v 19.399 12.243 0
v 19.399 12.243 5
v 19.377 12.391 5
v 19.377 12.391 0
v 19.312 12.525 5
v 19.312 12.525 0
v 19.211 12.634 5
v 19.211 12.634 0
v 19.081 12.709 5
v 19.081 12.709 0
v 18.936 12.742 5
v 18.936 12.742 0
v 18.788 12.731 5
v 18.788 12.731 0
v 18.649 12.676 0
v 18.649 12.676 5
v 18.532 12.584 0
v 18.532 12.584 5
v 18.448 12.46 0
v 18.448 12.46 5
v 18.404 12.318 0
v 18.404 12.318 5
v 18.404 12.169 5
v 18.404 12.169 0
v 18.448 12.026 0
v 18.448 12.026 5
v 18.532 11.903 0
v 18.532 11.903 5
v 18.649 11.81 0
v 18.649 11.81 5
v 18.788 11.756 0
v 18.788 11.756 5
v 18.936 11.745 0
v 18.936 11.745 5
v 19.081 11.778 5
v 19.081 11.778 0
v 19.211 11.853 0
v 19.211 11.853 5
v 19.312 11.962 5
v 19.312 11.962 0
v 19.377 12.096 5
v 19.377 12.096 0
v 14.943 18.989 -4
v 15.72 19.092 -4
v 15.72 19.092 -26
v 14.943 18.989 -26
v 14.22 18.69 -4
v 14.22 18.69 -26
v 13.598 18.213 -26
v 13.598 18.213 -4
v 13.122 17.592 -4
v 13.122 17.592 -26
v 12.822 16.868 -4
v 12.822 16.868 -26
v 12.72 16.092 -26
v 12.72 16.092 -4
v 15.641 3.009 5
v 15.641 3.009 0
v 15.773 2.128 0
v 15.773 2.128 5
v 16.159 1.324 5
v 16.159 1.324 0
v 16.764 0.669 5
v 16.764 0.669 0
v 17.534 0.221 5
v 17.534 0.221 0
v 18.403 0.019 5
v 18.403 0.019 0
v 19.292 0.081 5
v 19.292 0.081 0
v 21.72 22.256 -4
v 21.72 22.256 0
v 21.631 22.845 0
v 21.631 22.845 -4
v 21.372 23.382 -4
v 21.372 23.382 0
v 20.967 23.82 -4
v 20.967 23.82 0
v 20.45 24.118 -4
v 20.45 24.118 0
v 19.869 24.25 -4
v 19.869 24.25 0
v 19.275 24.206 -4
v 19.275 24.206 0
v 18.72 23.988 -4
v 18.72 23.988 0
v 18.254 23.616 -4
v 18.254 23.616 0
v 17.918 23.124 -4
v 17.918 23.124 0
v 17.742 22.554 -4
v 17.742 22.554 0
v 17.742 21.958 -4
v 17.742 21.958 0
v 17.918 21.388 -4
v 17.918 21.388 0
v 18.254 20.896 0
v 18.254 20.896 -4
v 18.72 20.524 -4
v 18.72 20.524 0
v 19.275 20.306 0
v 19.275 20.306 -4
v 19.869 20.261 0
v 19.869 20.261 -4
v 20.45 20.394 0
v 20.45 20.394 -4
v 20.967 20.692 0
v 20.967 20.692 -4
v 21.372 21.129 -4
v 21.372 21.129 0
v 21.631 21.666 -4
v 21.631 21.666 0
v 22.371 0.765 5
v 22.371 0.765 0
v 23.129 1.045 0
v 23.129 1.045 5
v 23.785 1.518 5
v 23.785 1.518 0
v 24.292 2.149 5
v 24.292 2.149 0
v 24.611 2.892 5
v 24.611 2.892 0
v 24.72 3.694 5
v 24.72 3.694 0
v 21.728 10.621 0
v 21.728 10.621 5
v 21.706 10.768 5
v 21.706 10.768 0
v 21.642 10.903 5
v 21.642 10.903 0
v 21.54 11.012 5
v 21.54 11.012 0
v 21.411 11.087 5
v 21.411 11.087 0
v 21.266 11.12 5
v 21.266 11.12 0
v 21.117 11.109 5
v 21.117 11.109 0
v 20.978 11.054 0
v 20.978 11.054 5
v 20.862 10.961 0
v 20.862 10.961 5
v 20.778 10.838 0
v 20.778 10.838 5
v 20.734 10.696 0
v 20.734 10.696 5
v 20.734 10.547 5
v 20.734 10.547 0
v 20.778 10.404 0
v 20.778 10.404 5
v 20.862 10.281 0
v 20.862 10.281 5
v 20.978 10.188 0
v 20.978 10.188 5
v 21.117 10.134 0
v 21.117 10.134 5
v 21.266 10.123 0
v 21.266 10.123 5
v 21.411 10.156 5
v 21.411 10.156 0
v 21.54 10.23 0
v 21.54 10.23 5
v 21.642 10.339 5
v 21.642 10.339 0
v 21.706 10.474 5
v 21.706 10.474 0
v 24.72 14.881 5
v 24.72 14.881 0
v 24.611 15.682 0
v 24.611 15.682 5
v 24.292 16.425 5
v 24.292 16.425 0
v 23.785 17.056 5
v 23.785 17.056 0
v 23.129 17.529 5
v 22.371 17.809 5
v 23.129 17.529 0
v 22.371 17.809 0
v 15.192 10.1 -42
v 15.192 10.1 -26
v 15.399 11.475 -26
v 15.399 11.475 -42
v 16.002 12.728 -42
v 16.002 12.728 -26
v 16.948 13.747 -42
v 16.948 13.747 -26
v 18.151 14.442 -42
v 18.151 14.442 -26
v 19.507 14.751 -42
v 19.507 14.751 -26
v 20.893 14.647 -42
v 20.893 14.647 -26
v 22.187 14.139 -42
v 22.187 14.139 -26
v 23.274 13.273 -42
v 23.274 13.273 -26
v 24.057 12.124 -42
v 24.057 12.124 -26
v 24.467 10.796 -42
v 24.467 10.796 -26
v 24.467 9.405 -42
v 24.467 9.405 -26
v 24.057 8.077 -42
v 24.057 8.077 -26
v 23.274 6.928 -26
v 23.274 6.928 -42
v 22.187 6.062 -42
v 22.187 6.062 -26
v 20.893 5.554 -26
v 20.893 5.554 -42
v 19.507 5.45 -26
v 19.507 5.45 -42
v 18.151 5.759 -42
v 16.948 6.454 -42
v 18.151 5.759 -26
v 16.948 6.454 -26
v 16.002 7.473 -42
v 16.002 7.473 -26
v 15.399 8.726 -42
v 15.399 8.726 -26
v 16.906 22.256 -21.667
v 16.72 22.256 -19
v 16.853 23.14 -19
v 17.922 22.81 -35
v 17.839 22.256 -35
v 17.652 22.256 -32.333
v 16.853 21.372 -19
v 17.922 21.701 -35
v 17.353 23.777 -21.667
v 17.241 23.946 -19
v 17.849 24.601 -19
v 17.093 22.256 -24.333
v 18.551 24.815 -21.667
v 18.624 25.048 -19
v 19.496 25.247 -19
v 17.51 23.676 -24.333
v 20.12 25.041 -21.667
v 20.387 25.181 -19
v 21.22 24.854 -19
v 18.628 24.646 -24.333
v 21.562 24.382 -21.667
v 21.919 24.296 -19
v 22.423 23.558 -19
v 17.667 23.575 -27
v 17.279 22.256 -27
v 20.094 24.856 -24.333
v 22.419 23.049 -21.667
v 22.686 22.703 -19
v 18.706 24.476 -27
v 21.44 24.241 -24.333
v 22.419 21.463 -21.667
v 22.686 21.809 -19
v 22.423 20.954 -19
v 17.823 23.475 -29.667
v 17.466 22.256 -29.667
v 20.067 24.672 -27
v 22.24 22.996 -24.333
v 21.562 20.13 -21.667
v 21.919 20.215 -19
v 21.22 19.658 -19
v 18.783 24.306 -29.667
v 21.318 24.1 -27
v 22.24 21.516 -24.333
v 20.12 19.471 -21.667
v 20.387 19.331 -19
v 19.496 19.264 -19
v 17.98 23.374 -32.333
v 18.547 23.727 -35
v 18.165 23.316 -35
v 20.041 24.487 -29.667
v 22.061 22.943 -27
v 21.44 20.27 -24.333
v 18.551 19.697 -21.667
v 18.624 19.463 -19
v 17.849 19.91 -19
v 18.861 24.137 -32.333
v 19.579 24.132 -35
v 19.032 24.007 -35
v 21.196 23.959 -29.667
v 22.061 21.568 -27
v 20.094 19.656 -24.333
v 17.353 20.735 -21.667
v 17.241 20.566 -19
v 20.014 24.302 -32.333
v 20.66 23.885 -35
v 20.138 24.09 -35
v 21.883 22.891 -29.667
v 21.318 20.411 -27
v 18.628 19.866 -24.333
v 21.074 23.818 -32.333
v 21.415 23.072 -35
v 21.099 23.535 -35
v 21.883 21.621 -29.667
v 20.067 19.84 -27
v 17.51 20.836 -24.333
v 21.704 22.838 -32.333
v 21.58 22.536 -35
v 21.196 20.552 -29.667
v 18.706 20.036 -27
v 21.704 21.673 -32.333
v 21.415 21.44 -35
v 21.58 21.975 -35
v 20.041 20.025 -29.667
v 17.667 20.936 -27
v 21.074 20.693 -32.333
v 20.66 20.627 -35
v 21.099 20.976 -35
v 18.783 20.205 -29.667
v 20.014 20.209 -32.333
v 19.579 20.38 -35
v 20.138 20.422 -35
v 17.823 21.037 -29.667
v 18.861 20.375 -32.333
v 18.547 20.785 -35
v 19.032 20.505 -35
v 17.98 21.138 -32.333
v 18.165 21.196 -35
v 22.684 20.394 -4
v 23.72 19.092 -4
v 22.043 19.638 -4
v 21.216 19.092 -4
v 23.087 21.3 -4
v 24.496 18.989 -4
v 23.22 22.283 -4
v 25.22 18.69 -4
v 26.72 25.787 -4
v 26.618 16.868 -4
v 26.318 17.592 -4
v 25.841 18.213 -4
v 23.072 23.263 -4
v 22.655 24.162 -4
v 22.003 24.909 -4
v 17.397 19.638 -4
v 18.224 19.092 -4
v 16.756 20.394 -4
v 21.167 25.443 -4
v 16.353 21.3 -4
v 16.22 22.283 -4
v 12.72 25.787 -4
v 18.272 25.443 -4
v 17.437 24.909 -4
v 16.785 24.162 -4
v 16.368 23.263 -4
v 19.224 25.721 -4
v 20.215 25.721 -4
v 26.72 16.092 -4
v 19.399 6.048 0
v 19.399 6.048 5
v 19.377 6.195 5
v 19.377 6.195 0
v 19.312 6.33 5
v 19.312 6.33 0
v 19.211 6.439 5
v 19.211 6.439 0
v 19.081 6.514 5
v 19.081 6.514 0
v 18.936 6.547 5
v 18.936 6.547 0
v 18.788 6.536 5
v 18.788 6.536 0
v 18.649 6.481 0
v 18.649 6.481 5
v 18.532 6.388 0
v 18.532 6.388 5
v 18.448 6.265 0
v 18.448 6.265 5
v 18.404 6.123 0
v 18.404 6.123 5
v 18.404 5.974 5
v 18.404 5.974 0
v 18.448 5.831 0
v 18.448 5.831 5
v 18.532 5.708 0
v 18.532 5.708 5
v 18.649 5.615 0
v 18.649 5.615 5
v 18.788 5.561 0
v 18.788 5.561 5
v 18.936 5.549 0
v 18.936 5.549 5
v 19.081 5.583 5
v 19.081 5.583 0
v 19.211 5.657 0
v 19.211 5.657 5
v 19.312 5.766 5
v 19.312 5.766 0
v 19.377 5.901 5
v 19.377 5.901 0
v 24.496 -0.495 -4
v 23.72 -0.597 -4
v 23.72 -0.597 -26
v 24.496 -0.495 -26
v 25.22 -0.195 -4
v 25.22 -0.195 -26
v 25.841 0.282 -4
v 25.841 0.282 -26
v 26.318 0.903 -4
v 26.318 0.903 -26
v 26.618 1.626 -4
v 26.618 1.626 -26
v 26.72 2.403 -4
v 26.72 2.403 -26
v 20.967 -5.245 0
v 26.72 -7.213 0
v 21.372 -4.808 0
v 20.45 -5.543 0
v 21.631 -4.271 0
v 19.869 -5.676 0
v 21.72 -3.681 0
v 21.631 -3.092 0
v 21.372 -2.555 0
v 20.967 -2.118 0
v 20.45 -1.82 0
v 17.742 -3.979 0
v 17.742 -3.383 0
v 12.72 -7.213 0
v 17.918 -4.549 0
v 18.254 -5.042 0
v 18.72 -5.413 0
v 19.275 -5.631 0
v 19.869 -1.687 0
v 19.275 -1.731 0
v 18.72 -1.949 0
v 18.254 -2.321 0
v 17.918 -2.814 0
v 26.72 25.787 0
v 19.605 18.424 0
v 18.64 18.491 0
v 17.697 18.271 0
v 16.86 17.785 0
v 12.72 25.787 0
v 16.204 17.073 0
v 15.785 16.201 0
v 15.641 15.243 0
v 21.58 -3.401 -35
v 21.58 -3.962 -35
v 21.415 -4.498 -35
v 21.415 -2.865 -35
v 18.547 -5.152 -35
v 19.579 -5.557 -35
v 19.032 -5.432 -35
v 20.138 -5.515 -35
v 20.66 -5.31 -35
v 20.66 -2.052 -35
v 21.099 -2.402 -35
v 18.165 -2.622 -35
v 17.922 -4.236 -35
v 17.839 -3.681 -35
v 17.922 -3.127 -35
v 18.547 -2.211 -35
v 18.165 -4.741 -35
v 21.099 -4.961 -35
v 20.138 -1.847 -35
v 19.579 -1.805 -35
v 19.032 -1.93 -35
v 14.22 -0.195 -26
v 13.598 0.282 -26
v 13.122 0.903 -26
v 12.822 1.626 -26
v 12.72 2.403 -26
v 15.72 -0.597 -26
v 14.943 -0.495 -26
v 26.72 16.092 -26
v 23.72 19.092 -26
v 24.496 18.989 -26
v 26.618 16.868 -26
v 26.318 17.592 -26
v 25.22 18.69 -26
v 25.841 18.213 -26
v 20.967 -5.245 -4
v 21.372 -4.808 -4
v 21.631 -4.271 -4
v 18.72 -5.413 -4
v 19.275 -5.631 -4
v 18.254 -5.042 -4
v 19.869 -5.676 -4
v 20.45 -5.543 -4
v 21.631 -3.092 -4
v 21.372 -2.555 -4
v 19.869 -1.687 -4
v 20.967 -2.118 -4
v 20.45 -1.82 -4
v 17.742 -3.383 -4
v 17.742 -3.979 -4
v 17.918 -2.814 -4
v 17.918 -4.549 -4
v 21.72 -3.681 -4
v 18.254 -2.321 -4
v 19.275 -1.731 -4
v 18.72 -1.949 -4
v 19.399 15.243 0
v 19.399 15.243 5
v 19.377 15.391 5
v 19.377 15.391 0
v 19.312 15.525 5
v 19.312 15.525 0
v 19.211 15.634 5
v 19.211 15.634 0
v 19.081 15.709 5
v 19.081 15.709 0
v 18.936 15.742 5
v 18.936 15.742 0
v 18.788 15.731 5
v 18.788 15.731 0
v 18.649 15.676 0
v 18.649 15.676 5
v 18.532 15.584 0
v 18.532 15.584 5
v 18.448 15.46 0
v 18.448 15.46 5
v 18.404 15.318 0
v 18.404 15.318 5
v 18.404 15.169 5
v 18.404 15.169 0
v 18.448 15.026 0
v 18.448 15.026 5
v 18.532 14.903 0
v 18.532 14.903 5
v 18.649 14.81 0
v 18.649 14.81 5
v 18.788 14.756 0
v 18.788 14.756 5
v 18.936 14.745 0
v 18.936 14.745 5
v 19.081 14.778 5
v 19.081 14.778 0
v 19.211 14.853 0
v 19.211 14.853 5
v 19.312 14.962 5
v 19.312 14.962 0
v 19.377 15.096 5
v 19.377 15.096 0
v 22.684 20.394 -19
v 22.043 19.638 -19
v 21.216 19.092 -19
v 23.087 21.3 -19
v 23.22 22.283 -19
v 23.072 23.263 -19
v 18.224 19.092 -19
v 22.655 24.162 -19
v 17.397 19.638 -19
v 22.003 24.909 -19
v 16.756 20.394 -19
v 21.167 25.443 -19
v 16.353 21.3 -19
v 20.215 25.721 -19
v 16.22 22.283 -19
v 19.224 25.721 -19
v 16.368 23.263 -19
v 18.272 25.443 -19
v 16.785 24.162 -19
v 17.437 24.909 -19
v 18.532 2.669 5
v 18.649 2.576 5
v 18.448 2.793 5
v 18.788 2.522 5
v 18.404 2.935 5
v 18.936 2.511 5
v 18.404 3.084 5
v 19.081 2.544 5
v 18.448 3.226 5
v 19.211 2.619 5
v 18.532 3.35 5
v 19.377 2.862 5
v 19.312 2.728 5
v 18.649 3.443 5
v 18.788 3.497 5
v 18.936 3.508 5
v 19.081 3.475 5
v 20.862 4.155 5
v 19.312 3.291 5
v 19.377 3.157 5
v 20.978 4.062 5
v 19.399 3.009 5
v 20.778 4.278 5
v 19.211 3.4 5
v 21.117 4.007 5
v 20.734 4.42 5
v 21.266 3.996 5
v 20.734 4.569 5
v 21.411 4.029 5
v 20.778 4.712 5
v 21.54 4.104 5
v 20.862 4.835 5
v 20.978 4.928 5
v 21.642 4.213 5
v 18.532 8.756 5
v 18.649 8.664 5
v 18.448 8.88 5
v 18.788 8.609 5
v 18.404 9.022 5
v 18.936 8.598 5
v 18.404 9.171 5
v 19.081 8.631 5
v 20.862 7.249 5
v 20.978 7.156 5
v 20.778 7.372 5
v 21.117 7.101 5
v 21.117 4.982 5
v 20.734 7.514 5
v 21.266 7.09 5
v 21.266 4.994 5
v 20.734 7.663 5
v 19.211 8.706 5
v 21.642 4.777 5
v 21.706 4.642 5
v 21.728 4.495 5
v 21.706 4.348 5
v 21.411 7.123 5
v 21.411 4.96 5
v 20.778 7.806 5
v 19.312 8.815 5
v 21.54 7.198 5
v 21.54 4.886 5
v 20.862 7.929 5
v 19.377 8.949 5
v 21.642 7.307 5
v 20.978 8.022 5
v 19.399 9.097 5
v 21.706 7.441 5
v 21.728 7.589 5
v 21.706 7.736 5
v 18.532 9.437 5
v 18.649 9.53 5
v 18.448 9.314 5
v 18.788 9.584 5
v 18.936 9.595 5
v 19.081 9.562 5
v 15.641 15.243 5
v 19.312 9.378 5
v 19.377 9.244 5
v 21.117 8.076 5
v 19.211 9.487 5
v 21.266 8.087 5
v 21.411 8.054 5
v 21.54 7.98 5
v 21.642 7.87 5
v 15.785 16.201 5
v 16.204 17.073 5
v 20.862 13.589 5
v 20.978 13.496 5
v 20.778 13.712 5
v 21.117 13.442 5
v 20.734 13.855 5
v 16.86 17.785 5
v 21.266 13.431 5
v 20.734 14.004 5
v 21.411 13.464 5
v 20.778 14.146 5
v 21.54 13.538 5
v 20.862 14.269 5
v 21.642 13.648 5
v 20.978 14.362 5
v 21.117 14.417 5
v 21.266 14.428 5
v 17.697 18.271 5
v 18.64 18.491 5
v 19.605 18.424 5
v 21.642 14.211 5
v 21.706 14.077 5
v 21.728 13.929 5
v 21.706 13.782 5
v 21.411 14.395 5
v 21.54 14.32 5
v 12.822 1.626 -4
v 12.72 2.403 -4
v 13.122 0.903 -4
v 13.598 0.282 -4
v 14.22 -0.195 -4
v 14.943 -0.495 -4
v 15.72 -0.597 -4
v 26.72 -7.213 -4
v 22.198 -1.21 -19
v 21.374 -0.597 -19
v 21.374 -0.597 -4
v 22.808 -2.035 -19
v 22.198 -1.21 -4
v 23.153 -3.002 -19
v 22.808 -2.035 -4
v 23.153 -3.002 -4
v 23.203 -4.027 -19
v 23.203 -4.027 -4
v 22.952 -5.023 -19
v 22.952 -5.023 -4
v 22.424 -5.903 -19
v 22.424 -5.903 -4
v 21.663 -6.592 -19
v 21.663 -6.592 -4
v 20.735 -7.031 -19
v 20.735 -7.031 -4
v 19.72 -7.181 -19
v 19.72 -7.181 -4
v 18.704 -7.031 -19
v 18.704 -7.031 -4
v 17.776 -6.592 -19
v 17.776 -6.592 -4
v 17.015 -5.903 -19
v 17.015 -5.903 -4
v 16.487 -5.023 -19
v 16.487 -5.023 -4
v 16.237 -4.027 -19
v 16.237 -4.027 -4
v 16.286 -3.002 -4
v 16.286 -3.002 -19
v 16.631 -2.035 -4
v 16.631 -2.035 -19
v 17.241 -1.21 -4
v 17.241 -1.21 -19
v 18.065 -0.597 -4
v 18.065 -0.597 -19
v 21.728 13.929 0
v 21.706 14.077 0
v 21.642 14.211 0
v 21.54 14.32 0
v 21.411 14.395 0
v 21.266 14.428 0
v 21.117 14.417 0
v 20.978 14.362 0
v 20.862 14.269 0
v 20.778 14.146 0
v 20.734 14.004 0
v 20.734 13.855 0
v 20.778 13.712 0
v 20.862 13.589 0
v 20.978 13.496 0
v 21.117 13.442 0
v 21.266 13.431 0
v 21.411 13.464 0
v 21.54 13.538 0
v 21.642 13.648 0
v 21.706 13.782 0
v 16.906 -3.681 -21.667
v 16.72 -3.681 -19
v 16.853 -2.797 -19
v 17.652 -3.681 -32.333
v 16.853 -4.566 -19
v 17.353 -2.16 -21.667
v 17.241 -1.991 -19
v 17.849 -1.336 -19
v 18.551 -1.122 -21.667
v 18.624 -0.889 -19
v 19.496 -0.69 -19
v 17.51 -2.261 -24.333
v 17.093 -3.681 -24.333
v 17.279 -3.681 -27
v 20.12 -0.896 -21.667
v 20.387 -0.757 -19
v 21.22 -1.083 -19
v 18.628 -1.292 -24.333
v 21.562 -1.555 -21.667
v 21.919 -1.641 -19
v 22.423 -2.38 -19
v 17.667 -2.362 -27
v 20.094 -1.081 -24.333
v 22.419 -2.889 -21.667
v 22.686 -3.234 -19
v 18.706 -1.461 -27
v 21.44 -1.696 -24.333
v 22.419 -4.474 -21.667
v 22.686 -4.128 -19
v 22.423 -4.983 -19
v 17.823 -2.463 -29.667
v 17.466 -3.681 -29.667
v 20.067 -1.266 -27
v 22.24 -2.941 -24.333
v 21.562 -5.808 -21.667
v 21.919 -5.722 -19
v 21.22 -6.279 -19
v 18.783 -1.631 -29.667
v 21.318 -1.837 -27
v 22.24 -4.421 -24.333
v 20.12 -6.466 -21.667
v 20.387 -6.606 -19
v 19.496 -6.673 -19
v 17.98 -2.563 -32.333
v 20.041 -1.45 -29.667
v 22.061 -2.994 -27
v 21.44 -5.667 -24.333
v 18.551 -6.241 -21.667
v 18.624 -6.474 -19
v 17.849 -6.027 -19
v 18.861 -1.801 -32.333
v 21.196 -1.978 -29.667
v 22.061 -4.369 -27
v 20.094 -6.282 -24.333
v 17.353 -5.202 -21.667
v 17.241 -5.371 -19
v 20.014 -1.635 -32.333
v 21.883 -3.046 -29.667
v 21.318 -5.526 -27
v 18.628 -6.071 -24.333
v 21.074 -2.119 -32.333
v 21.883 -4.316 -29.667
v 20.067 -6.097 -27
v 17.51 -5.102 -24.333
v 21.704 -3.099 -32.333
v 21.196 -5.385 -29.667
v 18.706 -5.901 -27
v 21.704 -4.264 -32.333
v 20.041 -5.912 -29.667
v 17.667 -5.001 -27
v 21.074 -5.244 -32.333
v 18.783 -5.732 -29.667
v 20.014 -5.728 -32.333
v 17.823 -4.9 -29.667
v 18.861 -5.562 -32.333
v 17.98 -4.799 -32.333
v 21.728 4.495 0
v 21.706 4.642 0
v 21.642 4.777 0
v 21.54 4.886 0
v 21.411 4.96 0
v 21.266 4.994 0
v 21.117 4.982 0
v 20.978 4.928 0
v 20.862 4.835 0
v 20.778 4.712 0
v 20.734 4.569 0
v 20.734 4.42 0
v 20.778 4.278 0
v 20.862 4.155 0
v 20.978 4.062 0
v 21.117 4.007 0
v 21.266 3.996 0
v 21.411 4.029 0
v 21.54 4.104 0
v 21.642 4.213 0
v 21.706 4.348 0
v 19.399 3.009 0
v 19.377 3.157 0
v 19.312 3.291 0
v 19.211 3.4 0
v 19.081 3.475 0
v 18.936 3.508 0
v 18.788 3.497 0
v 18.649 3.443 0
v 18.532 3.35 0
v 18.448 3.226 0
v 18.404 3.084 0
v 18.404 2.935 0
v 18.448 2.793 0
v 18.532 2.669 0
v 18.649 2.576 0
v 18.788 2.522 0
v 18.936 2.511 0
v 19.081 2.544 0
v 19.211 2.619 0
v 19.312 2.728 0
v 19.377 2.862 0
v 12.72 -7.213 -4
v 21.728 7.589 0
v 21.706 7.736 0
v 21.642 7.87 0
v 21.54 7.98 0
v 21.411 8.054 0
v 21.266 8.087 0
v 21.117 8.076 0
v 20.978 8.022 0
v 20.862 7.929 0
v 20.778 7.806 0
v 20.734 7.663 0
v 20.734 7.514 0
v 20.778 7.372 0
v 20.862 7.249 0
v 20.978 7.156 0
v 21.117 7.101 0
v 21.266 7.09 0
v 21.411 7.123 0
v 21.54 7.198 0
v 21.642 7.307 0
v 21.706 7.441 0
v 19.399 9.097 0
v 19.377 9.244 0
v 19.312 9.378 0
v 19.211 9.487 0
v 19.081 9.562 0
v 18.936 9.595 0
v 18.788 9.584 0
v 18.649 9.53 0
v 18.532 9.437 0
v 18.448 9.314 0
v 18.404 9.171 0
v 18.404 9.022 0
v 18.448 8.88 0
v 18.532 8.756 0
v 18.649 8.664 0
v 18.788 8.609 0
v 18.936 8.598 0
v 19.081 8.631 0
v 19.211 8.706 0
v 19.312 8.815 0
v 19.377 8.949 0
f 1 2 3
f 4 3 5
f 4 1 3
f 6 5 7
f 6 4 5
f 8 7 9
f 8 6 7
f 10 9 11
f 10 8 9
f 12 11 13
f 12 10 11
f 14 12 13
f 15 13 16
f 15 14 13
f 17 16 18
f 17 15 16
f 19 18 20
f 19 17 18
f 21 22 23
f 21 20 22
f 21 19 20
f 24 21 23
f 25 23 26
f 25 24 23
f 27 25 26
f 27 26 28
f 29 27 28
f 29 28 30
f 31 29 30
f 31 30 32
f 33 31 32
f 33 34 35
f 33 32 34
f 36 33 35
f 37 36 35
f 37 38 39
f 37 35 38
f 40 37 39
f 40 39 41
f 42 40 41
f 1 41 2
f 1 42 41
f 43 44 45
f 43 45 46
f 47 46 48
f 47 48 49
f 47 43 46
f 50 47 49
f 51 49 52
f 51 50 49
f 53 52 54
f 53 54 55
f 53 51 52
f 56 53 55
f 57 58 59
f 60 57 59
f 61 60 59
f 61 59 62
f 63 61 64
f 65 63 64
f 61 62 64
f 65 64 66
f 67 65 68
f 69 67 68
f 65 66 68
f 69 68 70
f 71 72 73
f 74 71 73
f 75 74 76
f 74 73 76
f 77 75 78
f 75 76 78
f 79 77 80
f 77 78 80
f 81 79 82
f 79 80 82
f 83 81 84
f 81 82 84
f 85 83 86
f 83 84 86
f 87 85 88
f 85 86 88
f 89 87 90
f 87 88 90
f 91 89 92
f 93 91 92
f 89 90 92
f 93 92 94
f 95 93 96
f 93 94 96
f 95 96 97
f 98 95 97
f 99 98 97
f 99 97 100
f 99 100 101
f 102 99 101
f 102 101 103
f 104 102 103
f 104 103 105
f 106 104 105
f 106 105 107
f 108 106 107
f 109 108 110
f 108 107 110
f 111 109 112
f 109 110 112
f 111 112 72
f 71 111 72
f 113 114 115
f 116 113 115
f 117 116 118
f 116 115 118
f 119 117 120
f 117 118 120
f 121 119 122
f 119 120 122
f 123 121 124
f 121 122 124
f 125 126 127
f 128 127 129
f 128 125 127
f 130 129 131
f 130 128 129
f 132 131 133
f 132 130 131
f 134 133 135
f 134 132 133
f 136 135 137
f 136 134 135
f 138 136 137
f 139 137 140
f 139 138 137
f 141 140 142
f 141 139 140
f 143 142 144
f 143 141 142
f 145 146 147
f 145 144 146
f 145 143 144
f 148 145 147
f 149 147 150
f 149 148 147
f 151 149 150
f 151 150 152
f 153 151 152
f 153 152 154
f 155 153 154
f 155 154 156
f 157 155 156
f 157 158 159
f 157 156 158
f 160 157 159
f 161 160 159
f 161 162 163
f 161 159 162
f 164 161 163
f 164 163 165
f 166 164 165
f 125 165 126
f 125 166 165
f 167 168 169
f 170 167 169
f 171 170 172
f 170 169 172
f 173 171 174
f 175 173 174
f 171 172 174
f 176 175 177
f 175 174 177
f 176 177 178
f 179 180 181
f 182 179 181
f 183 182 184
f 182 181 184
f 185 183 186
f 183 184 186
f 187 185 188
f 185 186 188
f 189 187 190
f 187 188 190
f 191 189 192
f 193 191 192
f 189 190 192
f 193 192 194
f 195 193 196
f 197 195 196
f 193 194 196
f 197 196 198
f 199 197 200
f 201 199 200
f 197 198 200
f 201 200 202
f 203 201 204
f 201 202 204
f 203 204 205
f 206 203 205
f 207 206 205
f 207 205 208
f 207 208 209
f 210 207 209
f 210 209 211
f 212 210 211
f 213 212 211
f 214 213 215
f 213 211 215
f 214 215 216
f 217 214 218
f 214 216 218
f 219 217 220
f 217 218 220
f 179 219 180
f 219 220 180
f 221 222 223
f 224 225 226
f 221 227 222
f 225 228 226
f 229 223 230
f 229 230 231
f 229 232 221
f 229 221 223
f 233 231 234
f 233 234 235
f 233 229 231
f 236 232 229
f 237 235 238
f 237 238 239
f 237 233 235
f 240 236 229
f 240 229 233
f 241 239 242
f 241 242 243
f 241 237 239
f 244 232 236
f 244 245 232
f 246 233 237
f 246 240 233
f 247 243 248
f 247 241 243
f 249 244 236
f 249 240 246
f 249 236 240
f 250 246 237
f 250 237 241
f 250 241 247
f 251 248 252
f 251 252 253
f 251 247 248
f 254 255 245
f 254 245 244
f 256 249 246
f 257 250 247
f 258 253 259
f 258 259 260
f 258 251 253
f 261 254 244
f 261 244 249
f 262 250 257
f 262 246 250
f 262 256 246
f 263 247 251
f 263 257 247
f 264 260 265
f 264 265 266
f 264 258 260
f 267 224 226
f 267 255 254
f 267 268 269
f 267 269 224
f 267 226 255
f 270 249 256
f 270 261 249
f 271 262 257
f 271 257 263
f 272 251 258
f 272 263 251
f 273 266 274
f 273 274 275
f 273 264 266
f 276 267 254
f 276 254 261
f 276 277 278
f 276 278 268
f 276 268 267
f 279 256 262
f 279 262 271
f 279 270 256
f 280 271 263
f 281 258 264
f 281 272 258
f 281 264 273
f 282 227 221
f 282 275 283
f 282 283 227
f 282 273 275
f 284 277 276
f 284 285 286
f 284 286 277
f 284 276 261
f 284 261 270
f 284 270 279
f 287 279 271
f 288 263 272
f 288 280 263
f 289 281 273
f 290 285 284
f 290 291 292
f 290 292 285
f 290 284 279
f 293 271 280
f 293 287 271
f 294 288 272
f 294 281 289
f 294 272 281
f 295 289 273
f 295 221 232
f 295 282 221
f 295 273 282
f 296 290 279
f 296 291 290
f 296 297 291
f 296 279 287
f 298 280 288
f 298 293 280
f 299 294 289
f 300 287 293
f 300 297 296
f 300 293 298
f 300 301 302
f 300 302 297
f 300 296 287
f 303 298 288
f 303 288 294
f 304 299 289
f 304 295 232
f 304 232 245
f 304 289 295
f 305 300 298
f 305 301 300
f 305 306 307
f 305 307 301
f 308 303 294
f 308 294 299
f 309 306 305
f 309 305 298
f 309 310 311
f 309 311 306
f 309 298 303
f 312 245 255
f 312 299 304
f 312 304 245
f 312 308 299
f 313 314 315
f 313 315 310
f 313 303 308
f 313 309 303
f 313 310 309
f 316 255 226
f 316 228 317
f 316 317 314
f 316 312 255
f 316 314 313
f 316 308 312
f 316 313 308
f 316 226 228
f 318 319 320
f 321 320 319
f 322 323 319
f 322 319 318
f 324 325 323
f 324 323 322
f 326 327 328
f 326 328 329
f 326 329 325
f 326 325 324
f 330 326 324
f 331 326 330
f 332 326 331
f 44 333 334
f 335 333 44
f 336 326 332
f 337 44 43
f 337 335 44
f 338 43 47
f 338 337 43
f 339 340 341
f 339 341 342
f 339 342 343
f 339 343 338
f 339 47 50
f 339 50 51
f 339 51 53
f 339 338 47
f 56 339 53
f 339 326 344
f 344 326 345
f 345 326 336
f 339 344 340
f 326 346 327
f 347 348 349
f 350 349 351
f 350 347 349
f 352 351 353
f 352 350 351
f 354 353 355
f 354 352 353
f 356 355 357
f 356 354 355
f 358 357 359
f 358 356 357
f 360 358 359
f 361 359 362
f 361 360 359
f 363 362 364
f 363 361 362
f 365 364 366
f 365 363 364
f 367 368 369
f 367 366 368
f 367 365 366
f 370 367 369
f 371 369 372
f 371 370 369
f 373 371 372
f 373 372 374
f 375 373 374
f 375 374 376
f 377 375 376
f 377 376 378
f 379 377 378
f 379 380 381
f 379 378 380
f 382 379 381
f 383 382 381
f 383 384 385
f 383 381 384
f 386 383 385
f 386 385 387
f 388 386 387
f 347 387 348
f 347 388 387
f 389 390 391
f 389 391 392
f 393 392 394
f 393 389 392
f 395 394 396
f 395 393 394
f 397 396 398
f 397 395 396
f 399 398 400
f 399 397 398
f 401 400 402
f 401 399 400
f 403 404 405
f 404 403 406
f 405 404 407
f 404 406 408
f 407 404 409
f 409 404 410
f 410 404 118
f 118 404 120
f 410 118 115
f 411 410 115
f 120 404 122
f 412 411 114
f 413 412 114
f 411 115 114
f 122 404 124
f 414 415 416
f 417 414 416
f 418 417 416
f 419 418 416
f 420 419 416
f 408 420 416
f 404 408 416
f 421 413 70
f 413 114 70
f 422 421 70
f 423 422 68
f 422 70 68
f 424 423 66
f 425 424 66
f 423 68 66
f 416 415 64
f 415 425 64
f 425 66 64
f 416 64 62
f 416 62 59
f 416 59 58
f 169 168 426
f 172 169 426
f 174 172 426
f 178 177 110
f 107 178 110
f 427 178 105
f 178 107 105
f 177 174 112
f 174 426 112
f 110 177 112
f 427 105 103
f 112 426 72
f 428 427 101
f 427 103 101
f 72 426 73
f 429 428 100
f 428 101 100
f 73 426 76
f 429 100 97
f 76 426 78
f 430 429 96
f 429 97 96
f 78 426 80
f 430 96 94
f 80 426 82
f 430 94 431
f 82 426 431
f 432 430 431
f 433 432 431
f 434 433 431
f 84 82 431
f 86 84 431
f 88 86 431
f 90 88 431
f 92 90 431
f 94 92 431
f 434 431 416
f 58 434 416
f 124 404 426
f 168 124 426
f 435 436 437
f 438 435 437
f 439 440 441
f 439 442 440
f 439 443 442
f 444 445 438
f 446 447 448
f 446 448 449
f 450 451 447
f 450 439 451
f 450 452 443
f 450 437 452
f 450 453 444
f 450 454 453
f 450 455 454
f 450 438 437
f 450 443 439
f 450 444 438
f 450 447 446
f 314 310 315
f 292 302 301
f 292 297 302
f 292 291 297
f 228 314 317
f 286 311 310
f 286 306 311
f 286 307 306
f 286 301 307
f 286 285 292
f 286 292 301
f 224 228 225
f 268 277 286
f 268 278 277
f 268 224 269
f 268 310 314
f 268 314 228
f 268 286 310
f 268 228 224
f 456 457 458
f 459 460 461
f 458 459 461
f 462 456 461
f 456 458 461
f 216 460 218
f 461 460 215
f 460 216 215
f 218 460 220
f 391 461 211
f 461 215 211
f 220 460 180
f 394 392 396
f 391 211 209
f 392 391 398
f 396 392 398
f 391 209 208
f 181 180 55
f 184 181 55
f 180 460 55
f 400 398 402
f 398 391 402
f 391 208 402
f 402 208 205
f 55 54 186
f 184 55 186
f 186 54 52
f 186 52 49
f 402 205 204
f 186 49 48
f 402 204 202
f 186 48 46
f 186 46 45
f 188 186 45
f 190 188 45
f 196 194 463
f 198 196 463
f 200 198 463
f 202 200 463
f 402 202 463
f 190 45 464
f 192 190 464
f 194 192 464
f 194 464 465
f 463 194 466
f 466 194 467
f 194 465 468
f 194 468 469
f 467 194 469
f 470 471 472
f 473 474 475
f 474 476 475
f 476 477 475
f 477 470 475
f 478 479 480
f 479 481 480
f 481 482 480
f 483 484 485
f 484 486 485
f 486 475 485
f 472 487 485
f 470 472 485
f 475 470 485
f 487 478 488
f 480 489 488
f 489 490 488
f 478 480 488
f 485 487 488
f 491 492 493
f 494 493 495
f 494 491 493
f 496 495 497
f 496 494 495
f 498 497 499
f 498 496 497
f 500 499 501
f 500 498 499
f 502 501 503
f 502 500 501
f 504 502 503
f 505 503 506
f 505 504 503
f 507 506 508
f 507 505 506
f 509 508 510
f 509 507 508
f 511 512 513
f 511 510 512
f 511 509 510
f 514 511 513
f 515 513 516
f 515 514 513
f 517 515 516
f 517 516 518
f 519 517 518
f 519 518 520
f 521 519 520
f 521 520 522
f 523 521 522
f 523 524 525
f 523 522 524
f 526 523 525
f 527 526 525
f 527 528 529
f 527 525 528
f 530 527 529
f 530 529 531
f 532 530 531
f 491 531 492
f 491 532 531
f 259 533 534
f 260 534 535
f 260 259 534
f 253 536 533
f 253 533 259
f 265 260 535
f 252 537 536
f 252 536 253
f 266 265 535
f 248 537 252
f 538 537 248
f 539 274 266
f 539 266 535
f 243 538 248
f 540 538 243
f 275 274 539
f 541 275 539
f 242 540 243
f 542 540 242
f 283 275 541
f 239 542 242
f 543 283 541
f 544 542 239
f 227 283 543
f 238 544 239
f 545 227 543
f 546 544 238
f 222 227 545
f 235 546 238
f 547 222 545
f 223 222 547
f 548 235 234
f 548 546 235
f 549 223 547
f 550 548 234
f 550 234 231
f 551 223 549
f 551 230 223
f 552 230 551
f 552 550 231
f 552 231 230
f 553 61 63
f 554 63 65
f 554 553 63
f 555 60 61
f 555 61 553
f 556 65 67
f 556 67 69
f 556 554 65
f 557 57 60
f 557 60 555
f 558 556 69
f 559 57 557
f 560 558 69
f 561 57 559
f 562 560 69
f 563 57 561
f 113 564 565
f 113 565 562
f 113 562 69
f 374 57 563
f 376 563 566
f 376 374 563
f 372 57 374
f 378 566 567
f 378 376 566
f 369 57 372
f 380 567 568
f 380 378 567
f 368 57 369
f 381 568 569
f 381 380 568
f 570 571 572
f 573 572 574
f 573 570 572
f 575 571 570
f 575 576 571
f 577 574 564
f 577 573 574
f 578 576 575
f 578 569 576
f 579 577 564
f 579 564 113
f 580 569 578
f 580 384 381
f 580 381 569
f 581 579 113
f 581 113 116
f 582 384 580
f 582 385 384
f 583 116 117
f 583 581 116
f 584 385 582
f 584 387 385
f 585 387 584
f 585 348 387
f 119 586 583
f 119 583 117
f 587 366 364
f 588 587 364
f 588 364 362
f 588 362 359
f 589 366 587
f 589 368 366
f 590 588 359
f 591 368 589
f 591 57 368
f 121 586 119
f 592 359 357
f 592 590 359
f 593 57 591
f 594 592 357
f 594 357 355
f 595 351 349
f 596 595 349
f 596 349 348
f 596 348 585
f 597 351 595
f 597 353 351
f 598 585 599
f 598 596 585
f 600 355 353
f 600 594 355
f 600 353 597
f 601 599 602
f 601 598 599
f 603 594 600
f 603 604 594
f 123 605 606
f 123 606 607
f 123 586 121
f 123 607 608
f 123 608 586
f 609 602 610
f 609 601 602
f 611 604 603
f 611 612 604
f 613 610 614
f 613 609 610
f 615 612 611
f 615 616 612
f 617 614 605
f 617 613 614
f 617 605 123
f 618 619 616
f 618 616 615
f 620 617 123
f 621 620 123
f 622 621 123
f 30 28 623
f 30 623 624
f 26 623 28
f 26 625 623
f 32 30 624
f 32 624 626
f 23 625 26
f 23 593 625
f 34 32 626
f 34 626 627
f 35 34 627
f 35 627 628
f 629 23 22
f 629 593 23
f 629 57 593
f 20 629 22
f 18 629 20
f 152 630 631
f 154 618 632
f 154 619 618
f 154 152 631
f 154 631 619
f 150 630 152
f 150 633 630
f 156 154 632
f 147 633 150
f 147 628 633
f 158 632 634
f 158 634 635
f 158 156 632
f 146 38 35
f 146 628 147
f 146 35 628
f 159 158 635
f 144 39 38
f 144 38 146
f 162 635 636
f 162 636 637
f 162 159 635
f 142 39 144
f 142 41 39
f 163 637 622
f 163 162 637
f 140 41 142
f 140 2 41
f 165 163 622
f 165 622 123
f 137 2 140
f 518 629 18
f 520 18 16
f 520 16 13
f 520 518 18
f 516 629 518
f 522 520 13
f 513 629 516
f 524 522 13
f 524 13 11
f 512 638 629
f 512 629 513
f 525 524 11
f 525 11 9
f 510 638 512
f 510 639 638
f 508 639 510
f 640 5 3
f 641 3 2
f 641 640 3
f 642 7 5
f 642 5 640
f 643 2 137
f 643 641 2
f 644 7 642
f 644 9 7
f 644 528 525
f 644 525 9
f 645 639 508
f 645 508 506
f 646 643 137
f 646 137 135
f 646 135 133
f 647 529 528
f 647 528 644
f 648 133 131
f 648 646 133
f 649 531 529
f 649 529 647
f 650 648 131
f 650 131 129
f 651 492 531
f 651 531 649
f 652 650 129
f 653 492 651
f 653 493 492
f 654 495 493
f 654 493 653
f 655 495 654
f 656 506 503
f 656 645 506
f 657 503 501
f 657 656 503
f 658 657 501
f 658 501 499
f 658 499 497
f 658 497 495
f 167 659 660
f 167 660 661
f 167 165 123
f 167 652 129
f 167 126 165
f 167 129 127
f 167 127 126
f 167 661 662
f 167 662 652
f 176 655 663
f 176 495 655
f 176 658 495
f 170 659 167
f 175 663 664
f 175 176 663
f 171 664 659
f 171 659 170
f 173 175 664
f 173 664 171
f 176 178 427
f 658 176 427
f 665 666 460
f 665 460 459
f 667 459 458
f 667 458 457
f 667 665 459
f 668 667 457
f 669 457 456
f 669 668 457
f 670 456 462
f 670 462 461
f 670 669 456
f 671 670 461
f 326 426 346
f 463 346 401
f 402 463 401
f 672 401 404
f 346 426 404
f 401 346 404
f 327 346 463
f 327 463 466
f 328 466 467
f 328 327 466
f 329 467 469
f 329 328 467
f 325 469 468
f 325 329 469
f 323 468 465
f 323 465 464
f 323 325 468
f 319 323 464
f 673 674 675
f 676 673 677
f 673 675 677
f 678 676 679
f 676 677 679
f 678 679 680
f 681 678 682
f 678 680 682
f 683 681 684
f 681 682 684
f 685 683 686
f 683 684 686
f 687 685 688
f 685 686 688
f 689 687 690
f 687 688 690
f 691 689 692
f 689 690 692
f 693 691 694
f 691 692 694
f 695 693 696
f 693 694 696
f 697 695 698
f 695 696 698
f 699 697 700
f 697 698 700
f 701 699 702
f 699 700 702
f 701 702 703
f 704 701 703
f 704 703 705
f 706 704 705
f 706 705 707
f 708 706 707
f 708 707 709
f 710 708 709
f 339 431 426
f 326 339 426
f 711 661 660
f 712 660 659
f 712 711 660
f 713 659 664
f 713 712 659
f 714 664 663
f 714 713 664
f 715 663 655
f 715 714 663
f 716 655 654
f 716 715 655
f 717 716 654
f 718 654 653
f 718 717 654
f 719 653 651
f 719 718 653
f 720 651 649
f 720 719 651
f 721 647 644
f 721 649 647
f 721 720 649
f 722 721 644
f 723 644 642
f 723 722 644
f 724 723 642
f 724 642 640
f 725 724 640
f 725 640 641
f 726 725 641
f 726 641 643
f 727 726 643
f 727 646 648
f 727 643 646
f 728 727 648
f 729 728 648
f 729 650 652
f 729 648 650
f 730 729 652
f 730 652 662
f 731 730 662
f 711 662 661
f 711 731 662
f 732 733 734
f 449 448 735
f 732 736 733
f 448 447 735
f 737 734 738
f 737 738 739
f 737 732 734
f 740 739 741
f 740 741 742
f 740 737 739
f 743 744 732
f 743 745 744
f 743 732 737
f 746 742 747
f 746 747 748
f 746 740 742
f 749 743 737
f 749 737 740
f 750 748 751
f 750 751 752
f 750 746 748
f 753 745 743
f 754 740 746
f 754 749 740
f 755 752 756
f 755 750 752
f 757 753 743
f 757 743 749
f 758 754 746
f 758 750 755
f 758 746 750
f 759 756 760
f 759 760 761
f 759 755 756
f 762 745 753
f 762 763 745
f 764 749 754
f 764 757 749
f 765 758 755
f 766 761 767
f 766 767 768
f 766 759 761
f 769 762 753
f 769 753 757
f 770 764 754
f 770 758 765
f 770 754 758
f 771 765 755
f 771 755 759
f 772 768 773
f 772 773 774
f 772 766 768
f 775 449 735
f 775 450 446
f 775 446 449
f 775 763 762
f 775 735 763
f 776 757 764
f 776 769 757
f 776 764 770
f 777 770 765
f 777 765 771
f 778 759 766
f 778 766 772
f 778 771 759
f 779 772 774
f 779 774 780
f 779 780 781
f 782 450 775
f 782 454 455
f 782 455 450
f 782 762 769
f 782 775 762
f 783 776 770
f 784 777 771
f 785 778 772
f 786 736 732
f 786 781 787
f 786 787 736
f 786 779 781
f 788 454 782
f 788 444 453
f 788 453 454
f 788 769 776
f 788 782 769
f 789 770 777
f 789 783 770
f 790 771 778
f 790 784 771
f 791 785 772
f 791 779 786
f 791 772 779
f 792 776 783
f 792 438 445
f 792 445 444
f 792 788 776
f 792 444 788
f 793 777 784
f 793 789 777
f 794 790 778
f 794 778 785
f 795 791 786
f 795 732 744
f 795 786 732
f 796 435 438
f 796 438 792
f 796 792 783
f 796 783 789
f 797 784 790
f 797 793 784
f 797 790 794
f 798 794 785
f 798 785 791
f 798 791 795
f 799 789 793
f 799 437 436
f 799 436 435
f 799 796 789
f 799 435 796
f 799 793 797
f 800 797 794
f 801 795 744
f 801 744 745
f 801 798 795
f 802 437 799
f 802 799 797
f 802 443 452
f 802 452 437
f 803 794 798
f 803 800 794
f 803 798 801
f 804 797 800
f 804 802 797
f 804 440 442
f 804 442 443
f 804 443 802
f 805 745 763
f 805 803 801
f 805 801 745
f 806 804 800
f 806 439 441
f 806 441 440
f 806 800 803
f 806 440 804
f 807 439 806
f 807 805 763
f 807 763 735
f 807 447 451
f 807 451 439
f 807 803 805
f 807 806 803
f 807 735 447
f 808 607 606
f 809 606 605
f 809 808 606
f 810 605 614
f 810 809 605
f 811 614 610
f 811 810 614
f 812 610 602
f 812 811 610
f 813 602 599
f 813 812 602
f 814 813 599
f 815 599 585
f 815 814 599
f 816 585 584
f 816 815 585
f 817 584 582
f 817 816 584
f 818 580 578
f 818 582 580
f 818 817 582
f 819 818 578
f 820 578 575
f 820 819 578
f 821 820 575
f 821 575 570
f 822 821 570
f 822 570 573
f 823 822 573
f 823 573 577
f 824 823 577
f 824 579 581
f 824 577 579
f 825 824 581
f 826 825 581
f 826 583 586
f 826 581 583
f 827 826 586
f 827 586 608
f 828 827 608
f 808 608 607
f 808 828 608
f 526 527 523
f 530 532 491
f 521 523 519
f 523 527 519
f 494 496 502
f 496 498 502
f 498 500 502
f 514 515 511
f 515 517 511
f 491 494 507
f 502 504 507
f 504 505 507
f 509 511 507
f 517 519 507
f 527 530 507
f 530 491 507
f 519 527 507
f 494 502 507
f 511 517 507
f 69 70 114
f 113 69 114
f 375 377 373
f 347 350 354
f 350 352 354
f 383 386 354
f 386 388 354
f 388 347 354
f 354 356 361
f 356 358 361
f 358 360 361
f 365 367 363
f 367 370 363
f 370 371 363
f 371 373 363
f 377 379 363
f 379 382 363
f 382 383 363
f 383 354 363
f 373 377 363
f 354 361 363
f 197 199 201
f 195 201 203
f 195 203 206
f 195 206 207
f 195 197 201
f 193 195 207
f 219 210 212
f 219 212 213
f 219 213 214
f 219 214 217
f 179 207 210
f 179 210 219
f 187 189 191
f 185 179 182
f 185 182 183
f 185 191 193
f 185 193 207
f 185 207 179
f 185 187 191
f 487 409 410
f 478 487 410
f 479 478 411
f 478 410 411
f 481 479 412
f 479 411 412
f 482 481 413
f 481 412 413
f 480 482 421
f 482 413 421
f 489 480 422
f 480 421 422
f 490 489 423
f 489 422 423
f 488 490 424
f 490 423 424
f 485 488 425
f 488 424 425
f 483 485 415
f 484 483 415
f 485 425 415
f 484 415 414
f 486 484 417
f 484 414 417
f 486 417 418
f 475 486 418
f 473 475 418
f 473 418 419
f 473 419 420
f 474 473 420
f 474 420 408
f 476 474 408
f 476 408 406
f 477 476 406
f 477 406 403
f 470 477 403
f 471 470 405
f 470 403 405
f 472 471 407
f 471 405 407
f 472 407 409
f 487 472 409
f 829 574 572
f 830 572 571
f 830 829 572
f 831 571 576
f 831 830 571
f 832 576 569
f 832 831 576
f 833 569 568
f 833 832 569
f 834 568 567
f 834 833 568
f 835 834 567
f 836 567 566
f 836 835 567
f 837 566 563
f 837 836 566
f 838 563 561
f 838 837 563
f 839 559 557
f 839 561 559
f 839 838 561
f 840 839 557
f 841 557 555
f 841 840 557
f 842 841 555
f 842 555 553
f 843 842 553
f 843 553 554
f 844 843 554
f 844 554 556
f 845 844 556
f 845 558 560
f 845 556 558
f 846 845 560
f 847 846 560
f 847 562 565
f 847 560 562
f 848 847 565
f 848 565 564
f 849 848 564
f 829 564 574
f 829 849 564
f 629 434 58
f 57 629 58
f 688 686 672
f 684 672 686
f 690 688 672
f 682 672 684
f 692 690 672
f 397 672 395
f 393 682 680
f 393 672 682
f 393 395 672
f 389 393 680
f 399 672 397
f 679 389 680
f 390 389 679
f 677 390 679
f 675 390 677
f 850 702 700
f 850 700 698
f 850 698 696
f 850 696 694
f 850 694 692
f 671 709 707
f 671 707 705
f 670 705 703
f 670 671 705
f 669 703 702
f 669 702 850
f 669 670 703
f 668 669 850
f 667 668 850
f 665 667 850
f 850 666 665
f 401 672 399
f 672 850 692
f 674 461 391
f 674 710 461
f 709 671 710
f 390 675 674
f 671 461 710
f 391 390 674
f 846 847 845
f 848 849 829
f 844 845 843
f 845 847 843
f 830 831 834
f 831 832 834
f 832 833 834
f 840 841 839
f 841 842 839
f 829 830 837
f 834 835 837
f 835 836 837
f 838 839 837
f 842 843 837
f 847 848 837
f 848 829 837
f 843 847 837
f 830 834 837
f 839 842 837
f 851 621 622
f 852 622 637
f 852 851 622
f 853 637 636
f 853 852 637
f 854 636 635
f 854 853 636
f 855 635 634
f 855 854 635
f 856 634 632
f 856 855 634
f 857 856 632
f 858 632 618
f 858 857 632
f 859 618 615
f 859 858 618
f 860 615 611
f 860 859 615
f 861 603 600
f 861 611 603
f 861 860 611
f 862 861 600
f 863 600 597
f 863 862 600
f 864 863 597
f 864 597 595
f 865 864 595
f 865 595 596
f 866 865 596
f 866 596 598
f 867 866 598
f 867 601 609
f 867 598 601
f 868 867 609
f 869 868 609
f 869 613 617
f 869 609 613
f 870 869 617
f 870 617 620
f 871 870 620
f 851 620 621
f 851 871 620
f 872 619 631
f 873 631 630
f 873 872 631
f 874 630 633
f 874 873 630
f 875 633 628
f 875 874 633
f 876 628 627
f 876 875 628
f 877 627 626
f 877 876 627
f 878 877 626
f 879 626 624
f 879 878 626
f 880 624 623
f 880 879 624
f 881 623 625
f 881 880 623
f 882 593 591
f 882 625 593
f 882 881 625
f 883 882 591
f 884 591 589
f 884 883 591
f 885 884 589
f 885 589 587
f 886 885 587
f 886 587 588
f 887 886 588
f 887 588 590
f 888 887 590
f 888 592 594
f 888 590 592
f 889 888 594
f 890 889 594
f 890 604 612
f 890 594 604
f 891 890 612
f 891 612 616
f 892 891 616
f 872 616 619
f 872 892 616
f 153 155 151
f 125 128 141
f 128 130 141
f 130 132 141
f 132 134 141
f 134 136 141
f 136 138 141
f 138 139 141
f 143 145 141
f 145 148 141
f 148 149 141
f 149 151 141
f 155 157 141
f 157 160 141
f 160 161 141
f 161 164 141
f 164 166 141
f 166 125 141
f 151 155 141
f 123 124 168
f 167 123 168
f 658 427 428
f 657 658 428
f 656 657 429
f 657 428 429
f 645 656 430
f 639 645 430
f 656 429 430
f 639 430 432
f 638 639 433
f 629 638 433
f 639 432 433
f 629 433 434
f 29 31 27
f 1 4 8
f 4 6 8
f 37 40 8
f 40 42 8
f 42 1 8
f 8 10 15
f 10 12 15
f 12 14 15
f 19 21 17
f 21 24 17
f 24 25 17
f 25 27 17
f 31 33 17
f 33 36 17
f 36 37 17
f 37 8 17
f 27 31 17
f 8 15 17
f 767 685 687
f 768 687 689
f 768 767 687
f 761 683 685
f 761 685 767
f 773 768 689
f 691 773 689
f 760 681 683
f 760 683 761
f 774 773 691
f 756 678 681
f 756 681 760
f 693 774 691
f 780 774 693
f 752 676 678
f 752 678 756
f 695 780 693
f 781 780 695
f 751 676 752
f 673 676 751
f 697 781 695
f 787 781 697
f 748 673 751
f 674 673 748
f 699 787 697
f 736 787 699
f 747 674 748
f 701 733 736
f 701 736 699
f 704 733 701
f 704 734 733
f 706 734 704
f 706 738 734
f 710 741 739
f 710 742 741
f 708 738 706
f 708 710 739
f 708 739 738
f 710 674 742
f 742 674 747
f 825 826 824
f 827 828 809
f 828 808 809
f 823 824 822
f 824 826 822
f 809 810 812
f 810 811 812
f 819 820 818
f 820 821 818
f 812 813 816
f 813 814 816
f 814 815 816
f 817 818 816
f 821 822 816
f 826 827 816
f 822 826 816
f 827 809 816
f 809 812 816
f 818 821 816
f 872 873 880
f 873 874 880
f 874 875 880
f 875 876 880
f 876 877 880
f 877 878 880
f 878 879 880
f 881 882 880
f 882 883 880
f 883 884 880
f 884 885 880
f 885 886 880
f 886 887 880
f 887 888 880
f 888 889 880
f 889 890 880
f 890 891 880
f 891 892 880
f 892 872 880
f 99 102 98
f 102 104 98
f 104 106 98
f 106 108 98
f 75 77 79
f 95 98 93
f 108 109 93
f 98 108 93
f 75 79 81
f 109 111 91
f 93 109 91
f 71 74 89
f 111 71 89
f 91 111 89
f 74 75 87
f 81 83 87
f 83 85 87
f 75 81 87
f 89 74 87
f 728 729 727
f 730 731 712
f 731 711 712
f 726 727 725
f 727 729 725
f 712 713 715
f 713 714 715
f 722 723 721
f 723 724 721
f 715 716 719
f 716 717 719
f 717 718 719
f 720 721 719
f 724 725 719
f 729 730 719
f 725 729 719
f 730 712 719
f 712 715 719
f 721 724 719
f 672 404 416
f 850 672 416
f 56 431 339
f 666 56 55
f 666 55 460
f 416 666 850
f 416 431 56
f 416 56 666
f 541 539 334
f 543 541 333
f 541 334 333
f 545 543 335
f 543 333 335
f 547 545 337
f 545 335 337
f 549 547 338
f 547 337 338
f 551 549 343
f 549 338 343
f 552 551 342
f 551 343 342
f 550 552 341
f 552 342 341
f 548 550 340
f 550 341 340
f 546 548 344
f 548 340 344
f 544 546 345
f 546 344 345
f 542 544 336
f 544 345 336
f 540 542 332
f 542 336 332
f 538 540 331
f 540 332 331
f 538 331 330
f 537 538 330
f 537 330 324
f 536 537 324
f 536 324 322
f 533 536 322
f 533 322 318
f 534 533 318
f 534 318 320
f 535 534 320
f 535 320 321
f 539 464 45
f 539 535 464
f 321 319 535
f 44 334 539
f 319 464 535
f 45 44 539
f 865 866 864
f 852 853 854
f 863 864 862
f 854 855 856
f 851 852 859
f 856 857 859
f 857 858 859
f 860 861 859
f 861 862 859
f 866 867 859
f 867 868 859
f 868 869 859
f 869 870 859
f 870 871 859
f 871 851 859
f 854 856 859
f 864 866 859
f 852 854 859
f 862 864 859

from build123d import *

# Parameters (mm, degrees)
EXTRUDE_1_DEPTH     = 5
SKETCH_2_5_R        = 0.5
CUT_EXTRUDE_1_DEPTH = 6
EXTRUDE_2_DEPTH     = 4
SKETCH_2_8_R        = 2
CUT_EXTRUDE_2_DEPTH = 4
SKETCH_3_R          = 3.5
EXTRUDE_3_DEPTH     = 15
EXTRUDE_4_DEPTH     = 22
SKETCH_5_R          = 3
EXTRUDE_5_DEPTH     = 16
EXTRUDE_5_TAPER     = 4
SKETCH_6_R          = 3
EXTRUDE_6_DEPTH     = 16
EXTRUDE_6_TAPER     = 4
SKETCH_7_R          = 4.663684065
EXTRUDE_7_DEPTH     = 16


with BuildPart() as part:
    # 草图2 → 凸台-拉伸1 (new body)
    with BuildSketch(Plane.XY):
        with BuildLine():
            Line((15.641000066, 15.243423767), (15.641000066, 3.009489297))
            ThreePointArc((15.641000066, 3.009489297), (16.763817885, 0.66936386), (19.291791439, 0.080928117))
            Line((19.291791439, 0.080928117), (22.370518946, 0.765089785))
            ThreePointArc((22.370518946, 0.765089785), (24.059853009, 1.816468785), (24.719727573, 3.693650965))
            Line((24.719727573, 3.693650965), (24.719727573, 14.880621327))
            ThreePointArc((24.719727573, 14.880621327), (24.059853009, 16.757803508), (22.370518946, 17.809182508))
            Line((22.370518946, 17.809182508), (19.605498159, 18.423631571))
            ThreePointArc((19.605498159, 18.423631571), (16.860299842, 17.784632476), (15.641000066, 15.243423767))
        make_face()
    extrude(amount=EXTRUDE_1_DEPTH)

    # 草图2<5> → 切除-拉伸1 (cut)
    with BuildSketch(Plane.XY):
        with Locations((18.898785314, 15.243423767)):
            Circle(SKETCH_2_5_R)
        with Locations((18.898785314, 12.243423767)):
            Circle(SKETCH_2_5_R)
        with Locations((18.898785314, 9.096563263)):
            Circle(SKETCH_2_5_R)
        with Locations((18.898785314, 6.048083228)):
            Circle(SKETCH_2_5_R)
        with Locations((18.898785314, 3.009489297)):
            Circle(SKETCH_2_5_R)
        with Locations((21.228436708, 13.929259558)):
            Circle(SKETCH_2_5_R)
        with Locations((21.228436708, 10.621115871)):
            Circle(SKETCH_2_5_R)
        with Locations((21.228436708, 7.588650825)):
            Circle(SKETCH_2_5_R)
        with Locations((21.228436708, 4.494923859)):
            Circle(SKETCH_2_5_R)
    extrude(amount=CUT_EXTRUDE_1_DEPTH, mode=Mode.SUBTRACT)

    # 草图2<6> → 凸台-拉伸2 (add)
    with BuildSketch(Plane.XY):
        Polygon((12.719727573, 9.287136146), (12.719727573, 25.787136146), (26.719727573, 25.787136146), (26.719727573, -7.212863854), (12.719727573, -7.212863854), align=None)
    extrude(amount=-EXTRUDE_2_DEPTH)

    # 草图2<8> → 切除-拉伸2 (cut)
    with BuildSketch(Plane.XY):
        with Locations((19.719727573, -3.681329619)):
            Circle(SKETCH_2_8_R)
        with Locations((19.719727573, 22.255849174)):
            Circle(SKETCH_2_8_R)
    extrude(amount=-CUT_EXTRUDE_2_DEPTH, mode=Mode.SUBTRACT)

    # 草图3 → 凸台-拉伸3 (add)
    with BuildSketch(Plane(origin=(0, 0, -4), x_dir=(-1, 0, 0), z_dir=(0, 0, -1))):
        with Locations((-19.719727573, 22.255849174)):
            Circle(SKETCH_3_R)
        with Locations((-19.719727573, -3.681329619)):
            Circle(SKETCH_3_R)
    extrude(amount=EXTRUDE_3_DEPTH)

    # 草图4 → 凸台-拉伸4 (add)
    with BuildSketch(Plane(origin=(0, 0, -4), x_dir=(-1, 0, 0), z_dir=(0, 0, -1))):
        with BuildLine():
            Line((-23.719727573, 19.091579688), (-15.719727573, 19.091579688))
            ThreePointArc((-15.719727573, 19.091579688), (-13.598407229, 18.212900031), (-12.719727573, 16.091579688))
            Line((-12.719727573, 16.091579688), (-12.719727573, 2.402820502))
            ThreePointArc((-12.719727573, 2.402820502), (-13.598407229, 0.281500159), (-15.719727573, -0.597179498))
            Line((-15.719727573, -0.597179498), (-23.719727573, -0.597179498))
            ThreePointArc((-23.719727573, -0.597179498), (-25.841047916, 0.281500159), (-26.719727573, 2.402820502))
            Line((-26.719727573, 2.402820502), (-26.719727573, 16.091579688))
            ThreePointArc((-26.719727573, 16.091579688), (-25.841047916, 18.212900031), (-23.719727573, 19.091579688))
        make_face()
    extrude(amount=EXTRUDE_4_DEPTH)

    # 草图5 → 凸台-拉伸5 (add)
    with BuildSketch(Plane(origin=(0, 0, -19), x_dir=(-1, 0, 0), z_dir=(0, 0, -1))):
        with Locations((-19.719727573, 22.255849174)):
            Circle(SKETCH_5_R)
    extrude(amount=EXTRUDE_5_DEPTH, taper=EXTRUDE_5_TAPER)

    # 草图6 → 凸台-拉伸6 (add)
    with BuildSketch(Plane(origin=(0, 0, -19), x_dir=(-1, 0, 0), z_dir=(0, 0, -1))):
        with Locations((-19.719727573, -3.681329619)):
            Circle(SKETCH_6_R)
    extrude(amount=EXTRUDE_6_DEPTH, taper=EXTRUDE_6_TAPER)

    # 草图7 → 凸台-拉伸7 (add)
    with BuildSketch(Plane(origin=(0, 0, -26), x_dir=(-1, 0, 0), z_dir=(0, 0, -1))):
        with Locations((-19.855274078, 10.100415179)):
            Circle(SKETCH_7_R)
    extrude(amount=EXTRUDE_7_DEPTH)


solid = part.part
